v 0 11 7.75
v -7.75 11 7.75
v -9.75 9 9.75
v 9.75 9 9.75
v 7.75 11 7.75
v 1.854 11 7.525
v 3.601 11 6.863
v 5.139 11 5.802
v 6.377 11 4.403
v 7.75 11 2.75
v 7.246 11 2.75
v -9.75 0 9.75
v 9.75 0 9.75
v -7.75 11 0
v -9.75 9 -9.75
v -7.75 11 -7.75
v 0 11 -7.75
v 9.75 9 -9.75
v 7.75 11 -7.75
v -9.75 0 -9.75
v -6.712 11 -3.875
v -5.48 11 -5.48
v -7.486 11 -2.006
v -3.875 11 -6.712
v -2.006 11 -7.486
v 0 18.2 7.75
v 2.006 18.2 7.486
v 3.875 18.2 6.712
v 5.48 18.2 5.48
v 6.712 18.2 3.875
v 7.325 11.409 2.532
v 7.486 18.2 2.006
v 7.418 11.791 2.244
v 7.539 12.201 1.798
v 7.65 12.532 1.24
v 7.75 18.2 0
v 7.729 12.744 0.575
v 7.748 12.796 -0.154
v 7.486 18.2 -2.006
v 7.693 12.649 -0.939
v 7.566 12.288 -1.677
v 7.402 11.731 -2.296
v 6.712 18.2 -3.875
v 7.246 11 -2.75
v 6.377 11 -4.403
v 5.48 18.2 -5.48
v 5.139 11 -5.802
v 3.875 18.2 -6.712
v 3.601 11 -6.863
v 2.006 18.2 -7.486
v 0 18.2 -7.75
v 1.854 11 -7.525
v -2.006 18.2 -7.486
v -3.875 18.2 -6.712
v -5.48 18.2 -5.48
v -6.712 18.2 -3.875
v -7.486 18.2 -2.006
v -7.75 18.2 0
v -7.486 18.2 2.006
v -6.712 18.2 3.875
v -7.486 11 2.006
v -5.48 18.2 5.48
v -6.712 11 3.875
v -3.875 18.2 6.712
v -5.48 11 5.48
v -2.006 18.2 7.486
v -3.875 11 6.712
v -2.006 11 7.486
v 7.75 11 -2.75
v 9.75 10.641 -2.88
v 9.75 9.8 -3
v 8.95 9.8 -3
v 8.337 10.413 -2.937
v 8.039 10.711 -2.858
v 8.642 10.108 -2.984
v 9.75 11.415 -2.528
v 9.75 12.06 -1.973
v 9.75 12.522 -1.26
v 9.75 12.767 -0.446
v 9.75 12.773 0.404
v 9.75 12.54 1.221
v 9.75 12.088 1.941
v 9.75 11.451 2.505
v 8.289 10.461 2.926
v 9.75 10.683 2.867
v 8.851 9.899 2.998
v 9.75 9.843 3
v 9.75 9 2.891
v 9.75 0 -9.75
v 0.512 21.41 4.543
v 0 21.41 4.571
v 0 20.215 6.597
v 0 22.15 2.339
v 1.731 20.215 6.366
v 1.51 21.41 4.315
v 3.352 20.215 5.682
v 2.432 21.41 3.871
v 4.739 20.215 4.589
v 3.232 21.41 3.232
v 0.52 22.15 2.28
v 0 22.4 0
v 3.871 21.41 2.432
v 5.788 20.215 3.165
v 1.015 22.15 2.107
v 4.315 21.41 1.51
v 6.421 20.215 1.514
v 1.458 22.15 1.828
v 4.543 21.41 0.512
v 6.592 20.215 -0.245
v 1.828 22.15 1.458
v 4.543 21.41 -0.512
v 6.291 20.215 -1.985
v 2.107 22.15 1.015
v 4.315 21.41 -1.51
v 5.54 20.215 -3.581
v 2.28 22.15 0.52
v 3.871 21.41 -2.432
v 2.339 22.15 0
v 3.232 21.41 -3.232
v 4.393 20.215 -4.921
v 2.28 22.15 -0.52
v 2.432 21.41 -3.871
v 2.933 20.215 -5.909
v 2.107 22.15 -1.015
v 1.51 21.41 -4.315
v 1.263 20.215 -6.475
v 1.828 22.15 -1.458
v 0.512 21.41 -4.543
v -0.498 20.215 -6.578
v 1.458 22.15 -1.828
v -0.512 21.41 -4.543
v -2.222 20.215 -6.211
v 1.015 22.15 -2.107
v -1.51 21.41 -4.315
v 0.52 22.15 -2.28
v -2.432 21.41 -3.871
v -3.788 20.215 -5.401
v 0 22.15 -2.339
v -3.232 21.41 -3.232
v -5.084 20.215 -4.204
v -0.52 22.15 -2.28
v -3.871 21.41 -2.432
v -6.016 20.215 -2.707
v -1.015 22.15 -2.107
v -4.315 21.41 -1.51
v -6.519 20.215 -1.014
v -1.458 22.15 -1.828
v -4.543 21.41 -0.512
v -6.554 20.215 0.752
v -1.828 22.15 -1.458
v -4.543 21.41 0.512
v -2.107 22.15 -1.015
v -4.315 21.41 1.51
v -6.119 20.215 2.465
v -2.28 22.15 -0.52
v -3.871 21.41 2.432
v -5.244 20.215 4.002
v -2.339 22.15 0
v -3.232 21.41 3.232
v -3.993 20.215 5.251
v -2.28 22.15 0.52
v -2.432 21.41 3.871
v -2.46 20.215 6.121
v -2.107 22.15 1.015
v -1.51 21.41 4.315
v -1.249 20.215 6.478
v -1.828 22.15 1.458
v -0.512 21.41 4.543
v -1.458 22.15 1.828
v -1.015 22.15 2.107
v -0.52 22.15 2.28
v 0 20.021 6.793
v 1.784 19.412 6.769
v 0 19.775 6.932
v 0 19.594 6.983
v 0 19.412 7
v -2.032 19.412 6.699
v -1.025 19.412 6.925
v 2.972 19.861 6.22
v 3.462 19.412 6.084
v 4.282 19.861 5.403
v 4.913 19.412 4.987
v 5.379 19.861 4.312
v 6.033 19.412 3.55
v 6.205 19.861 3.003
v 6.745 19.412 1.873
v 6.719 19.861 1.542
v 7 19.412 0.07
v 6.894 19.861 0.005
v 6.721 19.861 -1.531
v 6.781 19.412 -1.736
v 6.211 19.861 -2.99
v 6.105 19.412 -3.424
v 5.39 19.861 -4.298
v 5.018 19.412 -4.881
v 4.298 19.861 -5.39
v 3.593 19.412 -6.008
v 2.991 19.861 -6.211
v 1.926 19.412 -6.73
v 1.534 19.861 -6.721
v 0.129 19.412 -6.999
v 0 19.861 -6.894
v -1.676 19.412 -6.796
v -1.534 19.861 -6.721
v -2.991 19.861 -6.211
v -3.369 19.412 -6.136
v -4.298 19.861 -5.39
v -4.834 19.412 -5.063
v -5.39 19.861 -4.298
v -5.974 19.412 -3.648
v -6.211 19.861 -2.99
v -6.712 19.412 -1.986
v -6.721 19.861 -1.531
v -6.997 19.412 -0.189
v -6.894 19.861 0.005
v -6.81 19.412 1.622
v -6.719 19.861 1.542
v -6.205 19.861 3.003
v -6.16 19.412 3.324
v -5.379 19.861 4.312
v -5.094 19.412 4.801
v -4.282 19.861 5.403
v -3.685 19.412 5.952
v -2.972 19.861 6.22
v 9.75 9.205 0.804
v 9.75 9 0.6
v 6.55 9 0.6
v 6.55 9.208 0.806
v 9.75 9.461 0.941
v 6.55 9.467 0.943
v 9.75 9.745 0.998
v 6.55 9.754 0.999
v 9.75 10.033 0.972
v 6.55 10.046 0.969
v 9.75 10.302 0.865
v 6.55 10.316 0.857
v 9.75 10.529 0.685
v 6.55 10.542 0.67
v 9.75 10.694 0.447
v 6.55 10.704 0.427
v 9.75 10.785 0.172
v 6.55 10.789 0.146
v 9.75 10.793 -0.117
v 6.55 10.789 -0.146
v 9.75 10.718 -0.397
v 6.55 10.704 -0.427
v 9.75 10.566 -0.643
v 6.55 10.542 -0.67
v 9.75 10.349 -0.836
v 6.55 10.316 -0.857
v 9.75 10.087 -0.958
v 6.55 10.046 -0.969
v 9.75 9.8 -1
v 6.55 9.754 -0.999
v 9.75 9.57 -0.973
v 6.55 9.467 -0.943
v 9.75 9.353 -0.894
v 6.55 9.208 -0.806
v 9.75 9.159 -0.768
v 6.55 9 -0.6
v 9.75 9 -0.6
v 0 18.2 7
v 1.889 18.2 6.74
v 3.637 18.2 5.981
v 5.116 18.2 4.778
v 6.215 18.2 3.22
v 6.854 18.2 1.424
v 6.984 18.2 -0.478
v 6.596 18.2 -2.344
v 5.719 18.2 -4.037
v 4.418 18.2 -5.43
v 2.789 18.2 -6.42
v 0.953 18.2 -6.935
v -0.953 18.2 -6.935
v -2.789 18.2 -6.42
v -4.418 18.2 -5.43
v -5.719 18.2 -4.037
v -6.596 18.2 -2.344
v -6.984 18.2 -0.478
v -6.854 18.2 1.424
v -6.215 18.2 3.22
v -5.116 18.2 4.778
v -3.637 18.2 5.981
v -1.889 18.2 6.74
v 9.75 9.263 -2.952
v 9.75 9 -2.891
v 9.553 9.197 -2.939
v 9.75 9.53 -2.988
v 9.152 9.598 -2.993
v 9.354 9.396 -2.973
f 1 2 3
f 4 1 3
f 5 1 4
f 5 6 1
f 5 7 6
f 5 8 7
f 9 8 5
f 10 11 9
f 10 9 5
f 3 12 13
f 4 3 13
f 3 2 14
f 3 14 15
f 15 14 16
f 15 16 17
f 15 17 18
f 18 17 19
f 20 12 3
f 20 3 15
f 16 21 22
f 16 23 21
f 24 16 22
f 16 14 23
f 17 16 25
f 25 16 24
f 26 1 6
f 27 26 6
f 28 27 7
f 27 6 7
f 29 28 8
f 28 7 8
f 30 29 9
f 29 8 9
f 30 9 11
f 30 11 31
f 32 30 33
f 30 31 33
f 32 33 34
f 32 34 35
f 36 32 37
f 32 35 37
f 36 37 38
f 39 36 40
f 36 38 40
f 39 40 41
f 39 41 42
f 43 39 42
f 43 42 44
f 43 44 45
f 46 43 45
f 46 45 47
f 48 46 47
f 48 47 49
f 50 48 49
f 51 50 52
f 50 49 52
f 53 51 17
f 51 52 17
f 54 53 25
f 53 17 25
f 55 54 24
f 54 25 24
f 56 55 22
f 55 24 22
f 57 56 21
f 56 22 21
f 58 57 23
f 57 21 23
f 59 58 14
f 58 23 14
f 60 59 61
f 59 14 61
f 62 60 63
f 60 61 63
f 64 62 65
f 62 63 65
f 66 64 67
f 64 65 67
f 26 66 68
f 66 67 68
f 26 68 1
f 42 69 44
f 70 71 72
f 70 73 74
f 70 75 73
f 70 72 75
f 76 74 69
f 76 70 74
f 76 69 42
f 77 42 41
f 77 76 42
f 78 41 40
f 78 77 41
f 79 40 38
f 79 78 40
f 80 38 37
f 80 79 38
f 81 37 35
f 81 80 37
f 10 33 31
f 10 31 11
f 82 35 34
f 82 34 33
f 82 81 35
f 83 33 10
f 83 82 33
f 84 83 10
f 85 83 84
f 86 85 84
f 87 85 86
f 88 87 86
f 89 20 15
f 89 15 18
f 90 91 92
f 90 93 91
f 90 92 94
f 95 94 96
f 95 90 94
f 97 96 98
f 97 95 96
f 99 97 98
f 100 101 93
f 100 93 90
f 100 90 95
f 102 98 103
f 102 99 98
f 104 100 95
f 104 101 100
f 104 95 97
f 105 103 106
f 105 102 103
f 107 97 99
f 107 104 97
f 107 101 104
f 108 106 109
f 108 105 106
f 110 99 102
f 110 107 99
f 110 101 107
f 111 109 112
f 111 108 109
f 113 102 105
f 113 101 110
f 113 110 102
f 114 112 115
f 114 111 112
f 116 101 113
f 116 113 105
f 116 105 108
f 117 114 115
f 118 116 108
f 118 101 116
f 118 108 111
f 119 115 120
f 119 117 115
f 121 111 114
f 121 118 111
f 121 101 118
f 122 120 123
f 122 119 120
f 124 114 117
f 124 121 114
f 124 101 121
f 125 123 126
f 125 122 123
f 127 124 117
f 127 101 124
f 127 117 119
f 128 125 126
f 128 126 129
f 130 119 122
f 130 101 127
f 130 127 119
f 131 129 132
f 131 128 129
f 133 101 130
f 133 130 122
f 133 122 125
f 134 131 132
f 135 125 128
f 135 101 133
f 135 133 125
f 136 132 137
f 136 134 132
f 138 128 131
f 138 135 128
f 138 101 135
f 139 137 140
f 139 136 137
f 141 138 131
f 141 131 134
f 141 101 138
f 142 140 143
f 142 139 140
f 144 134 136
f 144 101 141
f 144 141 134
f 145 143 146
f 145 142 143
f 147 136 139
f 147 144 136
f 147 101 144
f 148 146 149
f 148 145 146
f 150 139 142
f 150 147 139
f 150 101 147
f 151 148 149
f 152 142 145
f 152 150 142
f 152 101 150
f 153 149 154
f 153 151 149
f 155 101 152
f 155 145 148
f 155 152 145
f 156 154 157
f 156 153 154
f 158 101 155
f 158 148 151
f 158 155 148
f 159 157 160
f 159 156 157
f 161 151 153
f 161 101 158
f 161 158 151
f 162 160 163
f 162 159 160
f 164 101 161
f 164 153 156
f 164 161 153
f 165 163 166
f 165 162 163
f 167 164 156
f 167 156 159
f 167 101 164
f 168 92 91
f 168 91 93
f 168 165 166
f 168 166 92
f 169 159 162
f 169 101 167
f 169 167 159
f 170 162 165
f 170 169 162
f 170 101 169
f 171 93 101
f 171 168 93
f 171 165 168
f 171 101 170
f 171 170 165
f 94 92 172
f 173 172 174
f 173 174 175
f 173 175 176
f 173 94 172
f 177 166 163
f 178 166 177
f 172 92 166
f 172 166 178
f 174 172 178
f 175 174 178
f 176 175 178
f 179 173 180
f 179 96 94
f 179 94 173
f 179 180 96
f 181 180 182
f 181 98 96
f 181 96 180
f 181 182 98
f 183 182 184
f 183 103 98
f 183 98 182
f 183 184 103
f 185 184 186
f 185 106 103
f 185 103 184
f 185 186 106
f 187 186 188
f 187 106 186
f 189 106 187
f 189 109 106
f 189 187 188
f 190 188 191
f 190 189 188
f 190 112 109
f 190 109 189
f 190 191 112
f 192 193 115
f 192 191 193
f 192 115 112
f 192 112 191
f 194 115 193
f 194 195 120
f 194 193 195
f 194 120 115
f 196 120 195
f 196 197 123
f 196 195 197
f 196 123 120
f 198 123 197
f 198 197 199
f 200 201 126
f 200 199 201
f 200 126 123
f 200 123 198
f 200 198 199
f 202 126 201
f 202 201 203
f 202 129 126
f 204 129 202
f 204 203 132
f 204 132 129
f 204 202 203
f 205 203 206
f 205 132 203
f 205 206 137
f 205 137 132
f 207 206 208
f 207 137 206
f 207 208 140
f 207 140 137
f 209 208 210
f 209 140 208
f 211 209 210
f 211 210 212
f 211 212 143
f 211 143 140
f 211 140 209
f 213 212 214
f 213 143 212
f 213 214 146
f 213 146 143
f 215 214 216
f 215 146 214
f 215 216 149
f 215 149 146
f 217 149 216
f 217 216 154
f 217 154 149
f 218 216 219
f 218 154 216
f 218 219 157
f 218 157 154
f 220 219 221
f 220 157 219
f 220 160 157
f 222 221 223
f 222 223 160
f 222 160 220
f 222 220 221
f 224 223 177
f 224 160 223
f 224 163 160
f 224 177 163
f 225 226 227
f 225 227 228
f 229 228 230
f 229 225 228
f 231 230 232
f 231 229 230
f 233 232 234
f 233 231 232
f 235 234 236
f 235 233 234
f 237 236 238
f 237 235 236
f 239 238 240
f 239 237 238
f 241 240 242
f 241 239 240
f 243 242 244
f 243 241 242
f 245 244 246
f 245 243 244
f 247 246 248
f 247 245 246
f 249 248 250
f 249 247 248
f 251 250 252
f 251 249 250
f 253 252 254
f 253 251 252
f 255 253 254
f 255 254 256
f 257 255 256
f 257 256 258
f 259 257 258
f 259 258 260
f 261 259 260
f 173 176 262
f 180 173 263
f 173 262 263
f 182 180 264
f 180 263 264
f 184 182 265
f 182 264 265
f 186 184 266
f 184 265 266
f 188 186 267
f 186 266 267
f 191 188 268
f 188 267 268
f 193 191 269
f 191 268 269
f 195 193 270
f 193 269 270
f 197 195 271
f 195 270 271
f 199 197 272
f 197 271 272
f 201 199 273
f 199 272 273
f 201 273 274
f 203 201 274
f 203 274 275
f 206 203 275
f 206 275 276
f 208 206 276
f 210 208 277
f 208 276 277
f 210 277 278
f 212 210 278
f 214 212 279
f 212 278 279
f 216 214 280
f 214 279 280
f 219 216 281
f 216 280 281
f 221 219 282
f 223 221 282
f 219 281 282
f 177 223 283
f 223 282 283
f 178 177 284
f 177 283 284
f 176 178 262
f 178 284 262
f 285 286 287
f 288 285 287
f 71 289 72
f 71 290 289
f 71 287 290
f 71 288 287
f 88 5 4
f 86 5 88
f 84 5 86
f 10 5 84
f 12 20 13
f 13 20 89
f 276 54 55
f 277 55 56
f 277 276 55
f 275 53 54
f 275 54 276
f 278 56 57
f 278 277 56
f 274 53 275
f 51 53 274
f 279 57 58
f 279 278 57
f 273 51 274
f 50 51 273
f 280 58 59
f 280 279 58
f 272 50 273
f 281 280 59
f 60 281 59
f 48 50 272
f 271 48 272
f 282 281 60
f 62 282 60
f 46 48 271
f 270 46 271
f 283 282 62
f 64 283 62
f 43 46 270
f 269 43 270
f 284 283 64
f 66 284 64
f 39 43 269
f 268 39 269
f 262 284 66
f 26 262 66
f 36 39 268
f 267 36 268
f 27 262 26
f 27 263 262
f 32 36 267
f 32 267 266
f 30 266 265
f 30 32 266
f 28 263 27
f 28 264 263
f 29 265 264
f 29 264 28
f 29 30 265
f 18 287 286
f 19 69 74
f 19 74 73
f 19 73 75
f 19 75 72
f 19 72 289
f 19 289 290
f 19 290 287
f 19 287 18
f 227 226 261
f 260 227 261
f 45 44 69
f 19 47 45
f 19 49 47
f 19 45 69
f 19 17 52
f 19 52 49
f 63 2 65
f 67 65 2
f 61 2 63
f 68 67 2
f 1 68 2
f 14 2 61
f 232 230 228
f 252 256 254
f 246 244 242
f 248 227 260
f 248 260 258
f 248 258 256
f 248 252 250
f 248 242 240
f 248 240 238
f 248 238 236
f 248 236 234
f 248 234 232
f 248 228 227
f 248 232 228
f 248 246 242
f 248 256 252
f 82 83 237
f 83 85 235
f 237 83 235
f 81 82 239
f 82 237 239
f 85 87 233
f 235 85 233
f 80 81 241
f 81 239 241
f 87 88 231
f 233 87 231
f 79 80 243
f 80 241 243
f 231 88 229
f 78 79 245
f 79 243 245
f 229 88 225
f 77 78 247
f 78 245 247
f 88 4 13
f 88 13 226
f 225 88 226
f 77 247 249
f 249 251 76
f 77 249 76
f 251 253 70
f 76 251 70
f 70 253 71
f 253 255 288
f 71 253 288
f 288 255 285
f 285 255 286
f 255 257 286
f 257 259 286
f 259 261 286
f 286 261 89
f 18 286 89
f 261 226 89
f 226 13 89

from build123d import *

# Parameters (mm, degrees)
CROQUIS1_W              = 19.5
CROQUIS1_H              = 19.5
SALIENTE_EXTRUIR1_DEPTH = 11
CHAFL_N1_SIZE           = 2
SALIENTE_EXTRUIR2_DEPTH = 9
CROQUIS3_R              = 7.75
SALIENTE_EXTRUIR3_DEPTH = 7.2
CORTAR_EXTRUIR1_DEPTH   = 3.2
CROQUIS5_R              = 7
SALIENTE_EXTRUIR4_DEPTH = 1.7
C_PULA1_FACE_RADIUS     = 7
C_PULA1_HEIGHT          = 2.5
REDONDEO1_R             = 1


with BuildPart() as part:
    # Croquis1 → Saliente-Extruir1 (new body)
    with BuildSketch(Plane(origin=(0, 0, 0), x_dir=(1, 0, 0), z_dir=(0, 1, 0))):
        Rectangle(CROQUIS1_W, CROQUIS1_H)
    extrude(amount=SALIENTE_EXTRUIR1_DEPTH)

    # Chaflán1
    chafl_n1_edges = [part.edges().sort_by_distance(p)[0] for p in [
        (-9.75, 11, 0),
        (0, 11, 9.75),
        (9.75, 11, 0),
        (0, 11, -9.75),
    ]]
    chamfer(chafl_n1_edges, length=CHAFL_N1_SIZE)

    # Croquis2 → Saliente-Extruir2 (add)
    with BuildSketch(Plane(origin=(9.75, 0, 0), x_dir=(0, 0, -1), z_dir=(1, 0, 0))):
        with BuildLine():
            ThreePointArc((-0.6, 9), (-0.447213595, 10.694427191), (1, 9.8))
            ThreePointArc((1, 9.8), (0.894427191, 9.352786405), (0.6, 9))
            Line((0.6, 9), (2.891366459, 9))
            ThreePointArc((2.891366459, 9), (2.972717559, 9.396328956), (3, 9.8))
            ThreePointArc((3, 9.8), (-0.403671044, 12.772717559), (-2.891366459, 9))
            Line((-2.891366459, 9), (-0.6, 9))
        make_face()
        with BuildLine():
            ThreePointArc((0.6, 9), (0, 8.8), (-0.6, 9))
            Line((-0.6, 9), (-2.891366459, 9))
            ThreePointArc((-2.891366459, 9), (0, 6.8), (2.891366459, 9))
            Line((2.891366459, 9), (0.6, 9))
        make_face()
    extrude(amount=-SALIENTE_EXTRUIR2_DEPTH)

    # Croquis3 → Saliente-Extruir3 (add)
    with BuildSketch(Plane(origin=(0, 11, 0), x_dir=(1, 0, 0), z_dir=(0, 1, 0))):
        with Locations(Location((0, 0, 0), (0, 0, 270))):
            Circle(CROQUIS3_R)
    extrude(amount=SALIENTE_EXTRUIR3_DEPTH)

    # Croquis4 → Cortar-Extruir1 (cut)
    with BuildSketch(Plane(origin=(9.75, 0, 0), x_dir=(0, 0, -1), z_dir=(1, 0, 0))):
        with BuildLine():
            Line((-0.6, 9), (0.6, 9))
            ThreePointArc((0.6, 9), (0, 10.8), (-0.6, 9))
        make_face()
    extrude(amount=-CORTAR_EXTRUIR1_DEPTH, mode=Mode.SUBTRACT)

    # Croquis5 → Saliente-Extruir4 (add)
    with BuildSketch(Plane(origin=(0, 18.2, 0), x_dir=(1, 0, 0), z_dir=(0, 1, 0))):
        with Locations(Location((0, 0, 0), (0, 0, 270))):
            Circle(CROQUIS5_R)
    extrude(amount=SALIENTE_EXTRUIR4_DEPTH)

    # Cúpula1: a dome of height H over a round flat face of radius A is a cap of a sphere of radius (A * A + H * H) / (2 * H)
    c_pula1_r = (C_PULA1_FACE_RADIUS * C_PULA1_FACE_RADIUS + C_PULA1_HEIGHT * C_PULA1_HEIGHT) / (2 * C_PULA1_HEIGHT)
    c_pula1_base = Plane((0, 19.9, 0), z_dir=(0, 1, 0))
    with Locations(c_pula1_base.offset(C_PULA1_HEIGHT - c_pula1_r)):
        c_pula1_ball = Sphere(c_pula1_r, mode=Mode.PRIVATE)
    add(split(c_pula1_ball, bisect_by=c_pula1_base, keep=Keep.TOP, mode=Mode.PRIVATE))

    # Redondeo1
    redondeo1_edges = [part.edges().sort_by_distance(p)[0] for p in [
        (0, 19.9, -7),
    ]]
    fillet(redondeo1_edges, radius=REDONDEO1_R)


solid = part.part
